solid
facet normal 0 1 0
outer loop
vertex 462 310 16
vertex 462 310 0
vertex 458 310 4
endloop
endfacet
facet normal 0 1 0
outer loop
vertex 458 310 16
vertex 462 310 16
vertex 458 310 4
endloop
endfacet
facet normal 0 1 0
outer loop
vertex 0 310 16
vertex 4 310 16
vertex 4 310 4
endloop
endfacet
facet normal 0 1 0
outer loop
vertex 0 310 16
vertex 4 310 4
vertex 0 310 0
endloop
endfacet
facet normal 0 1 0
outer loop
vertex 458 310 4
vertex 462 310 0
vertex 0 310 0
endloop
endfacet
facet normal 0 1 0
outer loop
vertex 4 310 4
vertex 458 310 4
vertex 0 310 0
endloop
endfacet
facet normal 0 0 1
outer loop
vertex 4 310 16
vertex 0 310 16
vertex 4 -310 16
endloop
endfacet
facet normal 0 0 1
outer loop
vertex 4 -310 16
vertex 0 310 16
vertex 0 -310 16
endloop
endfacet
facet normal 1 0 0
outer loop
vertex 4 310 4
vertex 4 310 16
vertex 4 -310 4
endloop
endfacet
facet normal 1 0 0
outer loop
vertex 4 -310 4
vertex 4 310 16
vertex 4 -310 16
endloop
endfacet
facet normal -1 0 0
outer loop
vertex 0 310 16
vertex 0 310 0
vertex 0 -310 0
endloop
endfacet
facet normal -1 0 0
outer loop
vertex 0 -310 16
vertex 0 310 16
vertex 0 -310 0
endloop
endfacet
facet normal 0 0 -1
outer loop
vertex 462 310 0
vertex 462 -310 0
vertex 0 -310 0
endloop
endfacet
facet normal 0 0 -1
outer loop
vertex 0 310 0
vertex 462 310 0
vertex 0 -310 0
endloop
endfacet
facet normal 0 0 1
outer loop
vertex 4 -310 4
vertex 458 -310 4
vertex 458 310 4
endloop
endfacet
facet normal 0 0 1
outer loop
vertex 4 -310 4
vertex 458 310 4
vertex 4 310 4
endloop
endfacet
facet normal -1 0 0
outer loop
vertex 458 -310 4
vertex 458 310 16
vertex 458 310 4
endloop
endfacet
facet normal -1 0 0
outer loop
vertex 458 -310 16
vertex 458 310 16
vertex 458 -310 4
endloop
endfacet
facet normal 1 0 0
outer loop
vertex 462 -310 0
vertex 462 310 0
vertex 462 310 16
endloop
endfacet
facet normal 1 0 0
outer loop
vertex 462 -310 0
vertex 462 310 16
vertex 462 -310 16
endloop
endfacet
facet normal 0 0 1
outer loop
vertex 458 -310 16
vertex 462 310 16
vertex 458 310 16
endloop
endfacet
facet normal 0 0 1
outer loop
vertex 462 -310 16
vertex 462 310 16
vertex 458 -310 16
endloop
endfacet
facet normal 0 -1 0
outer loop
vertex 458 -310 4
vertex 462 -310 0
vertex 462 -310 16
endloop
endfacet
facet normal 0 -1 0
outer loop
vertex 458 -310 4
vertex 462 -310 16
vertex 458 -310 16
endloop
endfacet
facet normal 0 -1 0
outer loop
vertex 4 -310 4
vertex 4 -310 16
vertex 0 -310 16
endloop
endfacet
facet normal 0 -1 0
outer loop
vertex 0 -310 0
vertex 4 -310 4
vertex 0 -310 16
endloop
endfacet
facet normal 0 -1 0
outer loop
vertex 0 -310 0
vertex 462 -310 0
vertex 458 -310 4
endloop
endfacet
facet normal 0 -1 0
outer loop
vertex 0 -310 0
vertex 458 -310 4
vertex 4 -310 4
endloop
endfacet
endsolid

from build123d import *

# Parameters (mm, degrees)
F0_W     = 231
F0_H     = 310
F1_DEPTH = 4
F2_W     = 310
F2_H     = 16
F3_DEPTH = 4


with BuildPart() as f1:
    # F0 (on Top) → F1 (new body)
    with BuildSketch(Plane.XY):
        with Locations((115.5, 155)):
            Rectangle(F0_W, F0_H)
    extrude(amount=F1_DEPTH)

    # F2 (on Right) → F3 (join)
    with BuildSketch(Plane.YZ):
        with Locations((155, 8)):
            Rectangle(F2_W, F2_H)
    extrude(amount=F3_DEPTH)

    # F4: F1 across face


with BuildPart() as f1_1:
    add(f1.part)
    add(f1.part.mirror(Plane(origin=(231, 155, 2), x_dir=(0, 1, 0), z_dir=(1, 0, 0))))

    # F5: F1 across face


with BuildPart() as f1_2:
    add(f1_1.part)
    add(f1_1.part.mirror(Plane(origin=(231, 0, 2.395062), x_dir=(1, 0, 0), z_dir=(0, -1, 0))))


solid = f1_2.part
